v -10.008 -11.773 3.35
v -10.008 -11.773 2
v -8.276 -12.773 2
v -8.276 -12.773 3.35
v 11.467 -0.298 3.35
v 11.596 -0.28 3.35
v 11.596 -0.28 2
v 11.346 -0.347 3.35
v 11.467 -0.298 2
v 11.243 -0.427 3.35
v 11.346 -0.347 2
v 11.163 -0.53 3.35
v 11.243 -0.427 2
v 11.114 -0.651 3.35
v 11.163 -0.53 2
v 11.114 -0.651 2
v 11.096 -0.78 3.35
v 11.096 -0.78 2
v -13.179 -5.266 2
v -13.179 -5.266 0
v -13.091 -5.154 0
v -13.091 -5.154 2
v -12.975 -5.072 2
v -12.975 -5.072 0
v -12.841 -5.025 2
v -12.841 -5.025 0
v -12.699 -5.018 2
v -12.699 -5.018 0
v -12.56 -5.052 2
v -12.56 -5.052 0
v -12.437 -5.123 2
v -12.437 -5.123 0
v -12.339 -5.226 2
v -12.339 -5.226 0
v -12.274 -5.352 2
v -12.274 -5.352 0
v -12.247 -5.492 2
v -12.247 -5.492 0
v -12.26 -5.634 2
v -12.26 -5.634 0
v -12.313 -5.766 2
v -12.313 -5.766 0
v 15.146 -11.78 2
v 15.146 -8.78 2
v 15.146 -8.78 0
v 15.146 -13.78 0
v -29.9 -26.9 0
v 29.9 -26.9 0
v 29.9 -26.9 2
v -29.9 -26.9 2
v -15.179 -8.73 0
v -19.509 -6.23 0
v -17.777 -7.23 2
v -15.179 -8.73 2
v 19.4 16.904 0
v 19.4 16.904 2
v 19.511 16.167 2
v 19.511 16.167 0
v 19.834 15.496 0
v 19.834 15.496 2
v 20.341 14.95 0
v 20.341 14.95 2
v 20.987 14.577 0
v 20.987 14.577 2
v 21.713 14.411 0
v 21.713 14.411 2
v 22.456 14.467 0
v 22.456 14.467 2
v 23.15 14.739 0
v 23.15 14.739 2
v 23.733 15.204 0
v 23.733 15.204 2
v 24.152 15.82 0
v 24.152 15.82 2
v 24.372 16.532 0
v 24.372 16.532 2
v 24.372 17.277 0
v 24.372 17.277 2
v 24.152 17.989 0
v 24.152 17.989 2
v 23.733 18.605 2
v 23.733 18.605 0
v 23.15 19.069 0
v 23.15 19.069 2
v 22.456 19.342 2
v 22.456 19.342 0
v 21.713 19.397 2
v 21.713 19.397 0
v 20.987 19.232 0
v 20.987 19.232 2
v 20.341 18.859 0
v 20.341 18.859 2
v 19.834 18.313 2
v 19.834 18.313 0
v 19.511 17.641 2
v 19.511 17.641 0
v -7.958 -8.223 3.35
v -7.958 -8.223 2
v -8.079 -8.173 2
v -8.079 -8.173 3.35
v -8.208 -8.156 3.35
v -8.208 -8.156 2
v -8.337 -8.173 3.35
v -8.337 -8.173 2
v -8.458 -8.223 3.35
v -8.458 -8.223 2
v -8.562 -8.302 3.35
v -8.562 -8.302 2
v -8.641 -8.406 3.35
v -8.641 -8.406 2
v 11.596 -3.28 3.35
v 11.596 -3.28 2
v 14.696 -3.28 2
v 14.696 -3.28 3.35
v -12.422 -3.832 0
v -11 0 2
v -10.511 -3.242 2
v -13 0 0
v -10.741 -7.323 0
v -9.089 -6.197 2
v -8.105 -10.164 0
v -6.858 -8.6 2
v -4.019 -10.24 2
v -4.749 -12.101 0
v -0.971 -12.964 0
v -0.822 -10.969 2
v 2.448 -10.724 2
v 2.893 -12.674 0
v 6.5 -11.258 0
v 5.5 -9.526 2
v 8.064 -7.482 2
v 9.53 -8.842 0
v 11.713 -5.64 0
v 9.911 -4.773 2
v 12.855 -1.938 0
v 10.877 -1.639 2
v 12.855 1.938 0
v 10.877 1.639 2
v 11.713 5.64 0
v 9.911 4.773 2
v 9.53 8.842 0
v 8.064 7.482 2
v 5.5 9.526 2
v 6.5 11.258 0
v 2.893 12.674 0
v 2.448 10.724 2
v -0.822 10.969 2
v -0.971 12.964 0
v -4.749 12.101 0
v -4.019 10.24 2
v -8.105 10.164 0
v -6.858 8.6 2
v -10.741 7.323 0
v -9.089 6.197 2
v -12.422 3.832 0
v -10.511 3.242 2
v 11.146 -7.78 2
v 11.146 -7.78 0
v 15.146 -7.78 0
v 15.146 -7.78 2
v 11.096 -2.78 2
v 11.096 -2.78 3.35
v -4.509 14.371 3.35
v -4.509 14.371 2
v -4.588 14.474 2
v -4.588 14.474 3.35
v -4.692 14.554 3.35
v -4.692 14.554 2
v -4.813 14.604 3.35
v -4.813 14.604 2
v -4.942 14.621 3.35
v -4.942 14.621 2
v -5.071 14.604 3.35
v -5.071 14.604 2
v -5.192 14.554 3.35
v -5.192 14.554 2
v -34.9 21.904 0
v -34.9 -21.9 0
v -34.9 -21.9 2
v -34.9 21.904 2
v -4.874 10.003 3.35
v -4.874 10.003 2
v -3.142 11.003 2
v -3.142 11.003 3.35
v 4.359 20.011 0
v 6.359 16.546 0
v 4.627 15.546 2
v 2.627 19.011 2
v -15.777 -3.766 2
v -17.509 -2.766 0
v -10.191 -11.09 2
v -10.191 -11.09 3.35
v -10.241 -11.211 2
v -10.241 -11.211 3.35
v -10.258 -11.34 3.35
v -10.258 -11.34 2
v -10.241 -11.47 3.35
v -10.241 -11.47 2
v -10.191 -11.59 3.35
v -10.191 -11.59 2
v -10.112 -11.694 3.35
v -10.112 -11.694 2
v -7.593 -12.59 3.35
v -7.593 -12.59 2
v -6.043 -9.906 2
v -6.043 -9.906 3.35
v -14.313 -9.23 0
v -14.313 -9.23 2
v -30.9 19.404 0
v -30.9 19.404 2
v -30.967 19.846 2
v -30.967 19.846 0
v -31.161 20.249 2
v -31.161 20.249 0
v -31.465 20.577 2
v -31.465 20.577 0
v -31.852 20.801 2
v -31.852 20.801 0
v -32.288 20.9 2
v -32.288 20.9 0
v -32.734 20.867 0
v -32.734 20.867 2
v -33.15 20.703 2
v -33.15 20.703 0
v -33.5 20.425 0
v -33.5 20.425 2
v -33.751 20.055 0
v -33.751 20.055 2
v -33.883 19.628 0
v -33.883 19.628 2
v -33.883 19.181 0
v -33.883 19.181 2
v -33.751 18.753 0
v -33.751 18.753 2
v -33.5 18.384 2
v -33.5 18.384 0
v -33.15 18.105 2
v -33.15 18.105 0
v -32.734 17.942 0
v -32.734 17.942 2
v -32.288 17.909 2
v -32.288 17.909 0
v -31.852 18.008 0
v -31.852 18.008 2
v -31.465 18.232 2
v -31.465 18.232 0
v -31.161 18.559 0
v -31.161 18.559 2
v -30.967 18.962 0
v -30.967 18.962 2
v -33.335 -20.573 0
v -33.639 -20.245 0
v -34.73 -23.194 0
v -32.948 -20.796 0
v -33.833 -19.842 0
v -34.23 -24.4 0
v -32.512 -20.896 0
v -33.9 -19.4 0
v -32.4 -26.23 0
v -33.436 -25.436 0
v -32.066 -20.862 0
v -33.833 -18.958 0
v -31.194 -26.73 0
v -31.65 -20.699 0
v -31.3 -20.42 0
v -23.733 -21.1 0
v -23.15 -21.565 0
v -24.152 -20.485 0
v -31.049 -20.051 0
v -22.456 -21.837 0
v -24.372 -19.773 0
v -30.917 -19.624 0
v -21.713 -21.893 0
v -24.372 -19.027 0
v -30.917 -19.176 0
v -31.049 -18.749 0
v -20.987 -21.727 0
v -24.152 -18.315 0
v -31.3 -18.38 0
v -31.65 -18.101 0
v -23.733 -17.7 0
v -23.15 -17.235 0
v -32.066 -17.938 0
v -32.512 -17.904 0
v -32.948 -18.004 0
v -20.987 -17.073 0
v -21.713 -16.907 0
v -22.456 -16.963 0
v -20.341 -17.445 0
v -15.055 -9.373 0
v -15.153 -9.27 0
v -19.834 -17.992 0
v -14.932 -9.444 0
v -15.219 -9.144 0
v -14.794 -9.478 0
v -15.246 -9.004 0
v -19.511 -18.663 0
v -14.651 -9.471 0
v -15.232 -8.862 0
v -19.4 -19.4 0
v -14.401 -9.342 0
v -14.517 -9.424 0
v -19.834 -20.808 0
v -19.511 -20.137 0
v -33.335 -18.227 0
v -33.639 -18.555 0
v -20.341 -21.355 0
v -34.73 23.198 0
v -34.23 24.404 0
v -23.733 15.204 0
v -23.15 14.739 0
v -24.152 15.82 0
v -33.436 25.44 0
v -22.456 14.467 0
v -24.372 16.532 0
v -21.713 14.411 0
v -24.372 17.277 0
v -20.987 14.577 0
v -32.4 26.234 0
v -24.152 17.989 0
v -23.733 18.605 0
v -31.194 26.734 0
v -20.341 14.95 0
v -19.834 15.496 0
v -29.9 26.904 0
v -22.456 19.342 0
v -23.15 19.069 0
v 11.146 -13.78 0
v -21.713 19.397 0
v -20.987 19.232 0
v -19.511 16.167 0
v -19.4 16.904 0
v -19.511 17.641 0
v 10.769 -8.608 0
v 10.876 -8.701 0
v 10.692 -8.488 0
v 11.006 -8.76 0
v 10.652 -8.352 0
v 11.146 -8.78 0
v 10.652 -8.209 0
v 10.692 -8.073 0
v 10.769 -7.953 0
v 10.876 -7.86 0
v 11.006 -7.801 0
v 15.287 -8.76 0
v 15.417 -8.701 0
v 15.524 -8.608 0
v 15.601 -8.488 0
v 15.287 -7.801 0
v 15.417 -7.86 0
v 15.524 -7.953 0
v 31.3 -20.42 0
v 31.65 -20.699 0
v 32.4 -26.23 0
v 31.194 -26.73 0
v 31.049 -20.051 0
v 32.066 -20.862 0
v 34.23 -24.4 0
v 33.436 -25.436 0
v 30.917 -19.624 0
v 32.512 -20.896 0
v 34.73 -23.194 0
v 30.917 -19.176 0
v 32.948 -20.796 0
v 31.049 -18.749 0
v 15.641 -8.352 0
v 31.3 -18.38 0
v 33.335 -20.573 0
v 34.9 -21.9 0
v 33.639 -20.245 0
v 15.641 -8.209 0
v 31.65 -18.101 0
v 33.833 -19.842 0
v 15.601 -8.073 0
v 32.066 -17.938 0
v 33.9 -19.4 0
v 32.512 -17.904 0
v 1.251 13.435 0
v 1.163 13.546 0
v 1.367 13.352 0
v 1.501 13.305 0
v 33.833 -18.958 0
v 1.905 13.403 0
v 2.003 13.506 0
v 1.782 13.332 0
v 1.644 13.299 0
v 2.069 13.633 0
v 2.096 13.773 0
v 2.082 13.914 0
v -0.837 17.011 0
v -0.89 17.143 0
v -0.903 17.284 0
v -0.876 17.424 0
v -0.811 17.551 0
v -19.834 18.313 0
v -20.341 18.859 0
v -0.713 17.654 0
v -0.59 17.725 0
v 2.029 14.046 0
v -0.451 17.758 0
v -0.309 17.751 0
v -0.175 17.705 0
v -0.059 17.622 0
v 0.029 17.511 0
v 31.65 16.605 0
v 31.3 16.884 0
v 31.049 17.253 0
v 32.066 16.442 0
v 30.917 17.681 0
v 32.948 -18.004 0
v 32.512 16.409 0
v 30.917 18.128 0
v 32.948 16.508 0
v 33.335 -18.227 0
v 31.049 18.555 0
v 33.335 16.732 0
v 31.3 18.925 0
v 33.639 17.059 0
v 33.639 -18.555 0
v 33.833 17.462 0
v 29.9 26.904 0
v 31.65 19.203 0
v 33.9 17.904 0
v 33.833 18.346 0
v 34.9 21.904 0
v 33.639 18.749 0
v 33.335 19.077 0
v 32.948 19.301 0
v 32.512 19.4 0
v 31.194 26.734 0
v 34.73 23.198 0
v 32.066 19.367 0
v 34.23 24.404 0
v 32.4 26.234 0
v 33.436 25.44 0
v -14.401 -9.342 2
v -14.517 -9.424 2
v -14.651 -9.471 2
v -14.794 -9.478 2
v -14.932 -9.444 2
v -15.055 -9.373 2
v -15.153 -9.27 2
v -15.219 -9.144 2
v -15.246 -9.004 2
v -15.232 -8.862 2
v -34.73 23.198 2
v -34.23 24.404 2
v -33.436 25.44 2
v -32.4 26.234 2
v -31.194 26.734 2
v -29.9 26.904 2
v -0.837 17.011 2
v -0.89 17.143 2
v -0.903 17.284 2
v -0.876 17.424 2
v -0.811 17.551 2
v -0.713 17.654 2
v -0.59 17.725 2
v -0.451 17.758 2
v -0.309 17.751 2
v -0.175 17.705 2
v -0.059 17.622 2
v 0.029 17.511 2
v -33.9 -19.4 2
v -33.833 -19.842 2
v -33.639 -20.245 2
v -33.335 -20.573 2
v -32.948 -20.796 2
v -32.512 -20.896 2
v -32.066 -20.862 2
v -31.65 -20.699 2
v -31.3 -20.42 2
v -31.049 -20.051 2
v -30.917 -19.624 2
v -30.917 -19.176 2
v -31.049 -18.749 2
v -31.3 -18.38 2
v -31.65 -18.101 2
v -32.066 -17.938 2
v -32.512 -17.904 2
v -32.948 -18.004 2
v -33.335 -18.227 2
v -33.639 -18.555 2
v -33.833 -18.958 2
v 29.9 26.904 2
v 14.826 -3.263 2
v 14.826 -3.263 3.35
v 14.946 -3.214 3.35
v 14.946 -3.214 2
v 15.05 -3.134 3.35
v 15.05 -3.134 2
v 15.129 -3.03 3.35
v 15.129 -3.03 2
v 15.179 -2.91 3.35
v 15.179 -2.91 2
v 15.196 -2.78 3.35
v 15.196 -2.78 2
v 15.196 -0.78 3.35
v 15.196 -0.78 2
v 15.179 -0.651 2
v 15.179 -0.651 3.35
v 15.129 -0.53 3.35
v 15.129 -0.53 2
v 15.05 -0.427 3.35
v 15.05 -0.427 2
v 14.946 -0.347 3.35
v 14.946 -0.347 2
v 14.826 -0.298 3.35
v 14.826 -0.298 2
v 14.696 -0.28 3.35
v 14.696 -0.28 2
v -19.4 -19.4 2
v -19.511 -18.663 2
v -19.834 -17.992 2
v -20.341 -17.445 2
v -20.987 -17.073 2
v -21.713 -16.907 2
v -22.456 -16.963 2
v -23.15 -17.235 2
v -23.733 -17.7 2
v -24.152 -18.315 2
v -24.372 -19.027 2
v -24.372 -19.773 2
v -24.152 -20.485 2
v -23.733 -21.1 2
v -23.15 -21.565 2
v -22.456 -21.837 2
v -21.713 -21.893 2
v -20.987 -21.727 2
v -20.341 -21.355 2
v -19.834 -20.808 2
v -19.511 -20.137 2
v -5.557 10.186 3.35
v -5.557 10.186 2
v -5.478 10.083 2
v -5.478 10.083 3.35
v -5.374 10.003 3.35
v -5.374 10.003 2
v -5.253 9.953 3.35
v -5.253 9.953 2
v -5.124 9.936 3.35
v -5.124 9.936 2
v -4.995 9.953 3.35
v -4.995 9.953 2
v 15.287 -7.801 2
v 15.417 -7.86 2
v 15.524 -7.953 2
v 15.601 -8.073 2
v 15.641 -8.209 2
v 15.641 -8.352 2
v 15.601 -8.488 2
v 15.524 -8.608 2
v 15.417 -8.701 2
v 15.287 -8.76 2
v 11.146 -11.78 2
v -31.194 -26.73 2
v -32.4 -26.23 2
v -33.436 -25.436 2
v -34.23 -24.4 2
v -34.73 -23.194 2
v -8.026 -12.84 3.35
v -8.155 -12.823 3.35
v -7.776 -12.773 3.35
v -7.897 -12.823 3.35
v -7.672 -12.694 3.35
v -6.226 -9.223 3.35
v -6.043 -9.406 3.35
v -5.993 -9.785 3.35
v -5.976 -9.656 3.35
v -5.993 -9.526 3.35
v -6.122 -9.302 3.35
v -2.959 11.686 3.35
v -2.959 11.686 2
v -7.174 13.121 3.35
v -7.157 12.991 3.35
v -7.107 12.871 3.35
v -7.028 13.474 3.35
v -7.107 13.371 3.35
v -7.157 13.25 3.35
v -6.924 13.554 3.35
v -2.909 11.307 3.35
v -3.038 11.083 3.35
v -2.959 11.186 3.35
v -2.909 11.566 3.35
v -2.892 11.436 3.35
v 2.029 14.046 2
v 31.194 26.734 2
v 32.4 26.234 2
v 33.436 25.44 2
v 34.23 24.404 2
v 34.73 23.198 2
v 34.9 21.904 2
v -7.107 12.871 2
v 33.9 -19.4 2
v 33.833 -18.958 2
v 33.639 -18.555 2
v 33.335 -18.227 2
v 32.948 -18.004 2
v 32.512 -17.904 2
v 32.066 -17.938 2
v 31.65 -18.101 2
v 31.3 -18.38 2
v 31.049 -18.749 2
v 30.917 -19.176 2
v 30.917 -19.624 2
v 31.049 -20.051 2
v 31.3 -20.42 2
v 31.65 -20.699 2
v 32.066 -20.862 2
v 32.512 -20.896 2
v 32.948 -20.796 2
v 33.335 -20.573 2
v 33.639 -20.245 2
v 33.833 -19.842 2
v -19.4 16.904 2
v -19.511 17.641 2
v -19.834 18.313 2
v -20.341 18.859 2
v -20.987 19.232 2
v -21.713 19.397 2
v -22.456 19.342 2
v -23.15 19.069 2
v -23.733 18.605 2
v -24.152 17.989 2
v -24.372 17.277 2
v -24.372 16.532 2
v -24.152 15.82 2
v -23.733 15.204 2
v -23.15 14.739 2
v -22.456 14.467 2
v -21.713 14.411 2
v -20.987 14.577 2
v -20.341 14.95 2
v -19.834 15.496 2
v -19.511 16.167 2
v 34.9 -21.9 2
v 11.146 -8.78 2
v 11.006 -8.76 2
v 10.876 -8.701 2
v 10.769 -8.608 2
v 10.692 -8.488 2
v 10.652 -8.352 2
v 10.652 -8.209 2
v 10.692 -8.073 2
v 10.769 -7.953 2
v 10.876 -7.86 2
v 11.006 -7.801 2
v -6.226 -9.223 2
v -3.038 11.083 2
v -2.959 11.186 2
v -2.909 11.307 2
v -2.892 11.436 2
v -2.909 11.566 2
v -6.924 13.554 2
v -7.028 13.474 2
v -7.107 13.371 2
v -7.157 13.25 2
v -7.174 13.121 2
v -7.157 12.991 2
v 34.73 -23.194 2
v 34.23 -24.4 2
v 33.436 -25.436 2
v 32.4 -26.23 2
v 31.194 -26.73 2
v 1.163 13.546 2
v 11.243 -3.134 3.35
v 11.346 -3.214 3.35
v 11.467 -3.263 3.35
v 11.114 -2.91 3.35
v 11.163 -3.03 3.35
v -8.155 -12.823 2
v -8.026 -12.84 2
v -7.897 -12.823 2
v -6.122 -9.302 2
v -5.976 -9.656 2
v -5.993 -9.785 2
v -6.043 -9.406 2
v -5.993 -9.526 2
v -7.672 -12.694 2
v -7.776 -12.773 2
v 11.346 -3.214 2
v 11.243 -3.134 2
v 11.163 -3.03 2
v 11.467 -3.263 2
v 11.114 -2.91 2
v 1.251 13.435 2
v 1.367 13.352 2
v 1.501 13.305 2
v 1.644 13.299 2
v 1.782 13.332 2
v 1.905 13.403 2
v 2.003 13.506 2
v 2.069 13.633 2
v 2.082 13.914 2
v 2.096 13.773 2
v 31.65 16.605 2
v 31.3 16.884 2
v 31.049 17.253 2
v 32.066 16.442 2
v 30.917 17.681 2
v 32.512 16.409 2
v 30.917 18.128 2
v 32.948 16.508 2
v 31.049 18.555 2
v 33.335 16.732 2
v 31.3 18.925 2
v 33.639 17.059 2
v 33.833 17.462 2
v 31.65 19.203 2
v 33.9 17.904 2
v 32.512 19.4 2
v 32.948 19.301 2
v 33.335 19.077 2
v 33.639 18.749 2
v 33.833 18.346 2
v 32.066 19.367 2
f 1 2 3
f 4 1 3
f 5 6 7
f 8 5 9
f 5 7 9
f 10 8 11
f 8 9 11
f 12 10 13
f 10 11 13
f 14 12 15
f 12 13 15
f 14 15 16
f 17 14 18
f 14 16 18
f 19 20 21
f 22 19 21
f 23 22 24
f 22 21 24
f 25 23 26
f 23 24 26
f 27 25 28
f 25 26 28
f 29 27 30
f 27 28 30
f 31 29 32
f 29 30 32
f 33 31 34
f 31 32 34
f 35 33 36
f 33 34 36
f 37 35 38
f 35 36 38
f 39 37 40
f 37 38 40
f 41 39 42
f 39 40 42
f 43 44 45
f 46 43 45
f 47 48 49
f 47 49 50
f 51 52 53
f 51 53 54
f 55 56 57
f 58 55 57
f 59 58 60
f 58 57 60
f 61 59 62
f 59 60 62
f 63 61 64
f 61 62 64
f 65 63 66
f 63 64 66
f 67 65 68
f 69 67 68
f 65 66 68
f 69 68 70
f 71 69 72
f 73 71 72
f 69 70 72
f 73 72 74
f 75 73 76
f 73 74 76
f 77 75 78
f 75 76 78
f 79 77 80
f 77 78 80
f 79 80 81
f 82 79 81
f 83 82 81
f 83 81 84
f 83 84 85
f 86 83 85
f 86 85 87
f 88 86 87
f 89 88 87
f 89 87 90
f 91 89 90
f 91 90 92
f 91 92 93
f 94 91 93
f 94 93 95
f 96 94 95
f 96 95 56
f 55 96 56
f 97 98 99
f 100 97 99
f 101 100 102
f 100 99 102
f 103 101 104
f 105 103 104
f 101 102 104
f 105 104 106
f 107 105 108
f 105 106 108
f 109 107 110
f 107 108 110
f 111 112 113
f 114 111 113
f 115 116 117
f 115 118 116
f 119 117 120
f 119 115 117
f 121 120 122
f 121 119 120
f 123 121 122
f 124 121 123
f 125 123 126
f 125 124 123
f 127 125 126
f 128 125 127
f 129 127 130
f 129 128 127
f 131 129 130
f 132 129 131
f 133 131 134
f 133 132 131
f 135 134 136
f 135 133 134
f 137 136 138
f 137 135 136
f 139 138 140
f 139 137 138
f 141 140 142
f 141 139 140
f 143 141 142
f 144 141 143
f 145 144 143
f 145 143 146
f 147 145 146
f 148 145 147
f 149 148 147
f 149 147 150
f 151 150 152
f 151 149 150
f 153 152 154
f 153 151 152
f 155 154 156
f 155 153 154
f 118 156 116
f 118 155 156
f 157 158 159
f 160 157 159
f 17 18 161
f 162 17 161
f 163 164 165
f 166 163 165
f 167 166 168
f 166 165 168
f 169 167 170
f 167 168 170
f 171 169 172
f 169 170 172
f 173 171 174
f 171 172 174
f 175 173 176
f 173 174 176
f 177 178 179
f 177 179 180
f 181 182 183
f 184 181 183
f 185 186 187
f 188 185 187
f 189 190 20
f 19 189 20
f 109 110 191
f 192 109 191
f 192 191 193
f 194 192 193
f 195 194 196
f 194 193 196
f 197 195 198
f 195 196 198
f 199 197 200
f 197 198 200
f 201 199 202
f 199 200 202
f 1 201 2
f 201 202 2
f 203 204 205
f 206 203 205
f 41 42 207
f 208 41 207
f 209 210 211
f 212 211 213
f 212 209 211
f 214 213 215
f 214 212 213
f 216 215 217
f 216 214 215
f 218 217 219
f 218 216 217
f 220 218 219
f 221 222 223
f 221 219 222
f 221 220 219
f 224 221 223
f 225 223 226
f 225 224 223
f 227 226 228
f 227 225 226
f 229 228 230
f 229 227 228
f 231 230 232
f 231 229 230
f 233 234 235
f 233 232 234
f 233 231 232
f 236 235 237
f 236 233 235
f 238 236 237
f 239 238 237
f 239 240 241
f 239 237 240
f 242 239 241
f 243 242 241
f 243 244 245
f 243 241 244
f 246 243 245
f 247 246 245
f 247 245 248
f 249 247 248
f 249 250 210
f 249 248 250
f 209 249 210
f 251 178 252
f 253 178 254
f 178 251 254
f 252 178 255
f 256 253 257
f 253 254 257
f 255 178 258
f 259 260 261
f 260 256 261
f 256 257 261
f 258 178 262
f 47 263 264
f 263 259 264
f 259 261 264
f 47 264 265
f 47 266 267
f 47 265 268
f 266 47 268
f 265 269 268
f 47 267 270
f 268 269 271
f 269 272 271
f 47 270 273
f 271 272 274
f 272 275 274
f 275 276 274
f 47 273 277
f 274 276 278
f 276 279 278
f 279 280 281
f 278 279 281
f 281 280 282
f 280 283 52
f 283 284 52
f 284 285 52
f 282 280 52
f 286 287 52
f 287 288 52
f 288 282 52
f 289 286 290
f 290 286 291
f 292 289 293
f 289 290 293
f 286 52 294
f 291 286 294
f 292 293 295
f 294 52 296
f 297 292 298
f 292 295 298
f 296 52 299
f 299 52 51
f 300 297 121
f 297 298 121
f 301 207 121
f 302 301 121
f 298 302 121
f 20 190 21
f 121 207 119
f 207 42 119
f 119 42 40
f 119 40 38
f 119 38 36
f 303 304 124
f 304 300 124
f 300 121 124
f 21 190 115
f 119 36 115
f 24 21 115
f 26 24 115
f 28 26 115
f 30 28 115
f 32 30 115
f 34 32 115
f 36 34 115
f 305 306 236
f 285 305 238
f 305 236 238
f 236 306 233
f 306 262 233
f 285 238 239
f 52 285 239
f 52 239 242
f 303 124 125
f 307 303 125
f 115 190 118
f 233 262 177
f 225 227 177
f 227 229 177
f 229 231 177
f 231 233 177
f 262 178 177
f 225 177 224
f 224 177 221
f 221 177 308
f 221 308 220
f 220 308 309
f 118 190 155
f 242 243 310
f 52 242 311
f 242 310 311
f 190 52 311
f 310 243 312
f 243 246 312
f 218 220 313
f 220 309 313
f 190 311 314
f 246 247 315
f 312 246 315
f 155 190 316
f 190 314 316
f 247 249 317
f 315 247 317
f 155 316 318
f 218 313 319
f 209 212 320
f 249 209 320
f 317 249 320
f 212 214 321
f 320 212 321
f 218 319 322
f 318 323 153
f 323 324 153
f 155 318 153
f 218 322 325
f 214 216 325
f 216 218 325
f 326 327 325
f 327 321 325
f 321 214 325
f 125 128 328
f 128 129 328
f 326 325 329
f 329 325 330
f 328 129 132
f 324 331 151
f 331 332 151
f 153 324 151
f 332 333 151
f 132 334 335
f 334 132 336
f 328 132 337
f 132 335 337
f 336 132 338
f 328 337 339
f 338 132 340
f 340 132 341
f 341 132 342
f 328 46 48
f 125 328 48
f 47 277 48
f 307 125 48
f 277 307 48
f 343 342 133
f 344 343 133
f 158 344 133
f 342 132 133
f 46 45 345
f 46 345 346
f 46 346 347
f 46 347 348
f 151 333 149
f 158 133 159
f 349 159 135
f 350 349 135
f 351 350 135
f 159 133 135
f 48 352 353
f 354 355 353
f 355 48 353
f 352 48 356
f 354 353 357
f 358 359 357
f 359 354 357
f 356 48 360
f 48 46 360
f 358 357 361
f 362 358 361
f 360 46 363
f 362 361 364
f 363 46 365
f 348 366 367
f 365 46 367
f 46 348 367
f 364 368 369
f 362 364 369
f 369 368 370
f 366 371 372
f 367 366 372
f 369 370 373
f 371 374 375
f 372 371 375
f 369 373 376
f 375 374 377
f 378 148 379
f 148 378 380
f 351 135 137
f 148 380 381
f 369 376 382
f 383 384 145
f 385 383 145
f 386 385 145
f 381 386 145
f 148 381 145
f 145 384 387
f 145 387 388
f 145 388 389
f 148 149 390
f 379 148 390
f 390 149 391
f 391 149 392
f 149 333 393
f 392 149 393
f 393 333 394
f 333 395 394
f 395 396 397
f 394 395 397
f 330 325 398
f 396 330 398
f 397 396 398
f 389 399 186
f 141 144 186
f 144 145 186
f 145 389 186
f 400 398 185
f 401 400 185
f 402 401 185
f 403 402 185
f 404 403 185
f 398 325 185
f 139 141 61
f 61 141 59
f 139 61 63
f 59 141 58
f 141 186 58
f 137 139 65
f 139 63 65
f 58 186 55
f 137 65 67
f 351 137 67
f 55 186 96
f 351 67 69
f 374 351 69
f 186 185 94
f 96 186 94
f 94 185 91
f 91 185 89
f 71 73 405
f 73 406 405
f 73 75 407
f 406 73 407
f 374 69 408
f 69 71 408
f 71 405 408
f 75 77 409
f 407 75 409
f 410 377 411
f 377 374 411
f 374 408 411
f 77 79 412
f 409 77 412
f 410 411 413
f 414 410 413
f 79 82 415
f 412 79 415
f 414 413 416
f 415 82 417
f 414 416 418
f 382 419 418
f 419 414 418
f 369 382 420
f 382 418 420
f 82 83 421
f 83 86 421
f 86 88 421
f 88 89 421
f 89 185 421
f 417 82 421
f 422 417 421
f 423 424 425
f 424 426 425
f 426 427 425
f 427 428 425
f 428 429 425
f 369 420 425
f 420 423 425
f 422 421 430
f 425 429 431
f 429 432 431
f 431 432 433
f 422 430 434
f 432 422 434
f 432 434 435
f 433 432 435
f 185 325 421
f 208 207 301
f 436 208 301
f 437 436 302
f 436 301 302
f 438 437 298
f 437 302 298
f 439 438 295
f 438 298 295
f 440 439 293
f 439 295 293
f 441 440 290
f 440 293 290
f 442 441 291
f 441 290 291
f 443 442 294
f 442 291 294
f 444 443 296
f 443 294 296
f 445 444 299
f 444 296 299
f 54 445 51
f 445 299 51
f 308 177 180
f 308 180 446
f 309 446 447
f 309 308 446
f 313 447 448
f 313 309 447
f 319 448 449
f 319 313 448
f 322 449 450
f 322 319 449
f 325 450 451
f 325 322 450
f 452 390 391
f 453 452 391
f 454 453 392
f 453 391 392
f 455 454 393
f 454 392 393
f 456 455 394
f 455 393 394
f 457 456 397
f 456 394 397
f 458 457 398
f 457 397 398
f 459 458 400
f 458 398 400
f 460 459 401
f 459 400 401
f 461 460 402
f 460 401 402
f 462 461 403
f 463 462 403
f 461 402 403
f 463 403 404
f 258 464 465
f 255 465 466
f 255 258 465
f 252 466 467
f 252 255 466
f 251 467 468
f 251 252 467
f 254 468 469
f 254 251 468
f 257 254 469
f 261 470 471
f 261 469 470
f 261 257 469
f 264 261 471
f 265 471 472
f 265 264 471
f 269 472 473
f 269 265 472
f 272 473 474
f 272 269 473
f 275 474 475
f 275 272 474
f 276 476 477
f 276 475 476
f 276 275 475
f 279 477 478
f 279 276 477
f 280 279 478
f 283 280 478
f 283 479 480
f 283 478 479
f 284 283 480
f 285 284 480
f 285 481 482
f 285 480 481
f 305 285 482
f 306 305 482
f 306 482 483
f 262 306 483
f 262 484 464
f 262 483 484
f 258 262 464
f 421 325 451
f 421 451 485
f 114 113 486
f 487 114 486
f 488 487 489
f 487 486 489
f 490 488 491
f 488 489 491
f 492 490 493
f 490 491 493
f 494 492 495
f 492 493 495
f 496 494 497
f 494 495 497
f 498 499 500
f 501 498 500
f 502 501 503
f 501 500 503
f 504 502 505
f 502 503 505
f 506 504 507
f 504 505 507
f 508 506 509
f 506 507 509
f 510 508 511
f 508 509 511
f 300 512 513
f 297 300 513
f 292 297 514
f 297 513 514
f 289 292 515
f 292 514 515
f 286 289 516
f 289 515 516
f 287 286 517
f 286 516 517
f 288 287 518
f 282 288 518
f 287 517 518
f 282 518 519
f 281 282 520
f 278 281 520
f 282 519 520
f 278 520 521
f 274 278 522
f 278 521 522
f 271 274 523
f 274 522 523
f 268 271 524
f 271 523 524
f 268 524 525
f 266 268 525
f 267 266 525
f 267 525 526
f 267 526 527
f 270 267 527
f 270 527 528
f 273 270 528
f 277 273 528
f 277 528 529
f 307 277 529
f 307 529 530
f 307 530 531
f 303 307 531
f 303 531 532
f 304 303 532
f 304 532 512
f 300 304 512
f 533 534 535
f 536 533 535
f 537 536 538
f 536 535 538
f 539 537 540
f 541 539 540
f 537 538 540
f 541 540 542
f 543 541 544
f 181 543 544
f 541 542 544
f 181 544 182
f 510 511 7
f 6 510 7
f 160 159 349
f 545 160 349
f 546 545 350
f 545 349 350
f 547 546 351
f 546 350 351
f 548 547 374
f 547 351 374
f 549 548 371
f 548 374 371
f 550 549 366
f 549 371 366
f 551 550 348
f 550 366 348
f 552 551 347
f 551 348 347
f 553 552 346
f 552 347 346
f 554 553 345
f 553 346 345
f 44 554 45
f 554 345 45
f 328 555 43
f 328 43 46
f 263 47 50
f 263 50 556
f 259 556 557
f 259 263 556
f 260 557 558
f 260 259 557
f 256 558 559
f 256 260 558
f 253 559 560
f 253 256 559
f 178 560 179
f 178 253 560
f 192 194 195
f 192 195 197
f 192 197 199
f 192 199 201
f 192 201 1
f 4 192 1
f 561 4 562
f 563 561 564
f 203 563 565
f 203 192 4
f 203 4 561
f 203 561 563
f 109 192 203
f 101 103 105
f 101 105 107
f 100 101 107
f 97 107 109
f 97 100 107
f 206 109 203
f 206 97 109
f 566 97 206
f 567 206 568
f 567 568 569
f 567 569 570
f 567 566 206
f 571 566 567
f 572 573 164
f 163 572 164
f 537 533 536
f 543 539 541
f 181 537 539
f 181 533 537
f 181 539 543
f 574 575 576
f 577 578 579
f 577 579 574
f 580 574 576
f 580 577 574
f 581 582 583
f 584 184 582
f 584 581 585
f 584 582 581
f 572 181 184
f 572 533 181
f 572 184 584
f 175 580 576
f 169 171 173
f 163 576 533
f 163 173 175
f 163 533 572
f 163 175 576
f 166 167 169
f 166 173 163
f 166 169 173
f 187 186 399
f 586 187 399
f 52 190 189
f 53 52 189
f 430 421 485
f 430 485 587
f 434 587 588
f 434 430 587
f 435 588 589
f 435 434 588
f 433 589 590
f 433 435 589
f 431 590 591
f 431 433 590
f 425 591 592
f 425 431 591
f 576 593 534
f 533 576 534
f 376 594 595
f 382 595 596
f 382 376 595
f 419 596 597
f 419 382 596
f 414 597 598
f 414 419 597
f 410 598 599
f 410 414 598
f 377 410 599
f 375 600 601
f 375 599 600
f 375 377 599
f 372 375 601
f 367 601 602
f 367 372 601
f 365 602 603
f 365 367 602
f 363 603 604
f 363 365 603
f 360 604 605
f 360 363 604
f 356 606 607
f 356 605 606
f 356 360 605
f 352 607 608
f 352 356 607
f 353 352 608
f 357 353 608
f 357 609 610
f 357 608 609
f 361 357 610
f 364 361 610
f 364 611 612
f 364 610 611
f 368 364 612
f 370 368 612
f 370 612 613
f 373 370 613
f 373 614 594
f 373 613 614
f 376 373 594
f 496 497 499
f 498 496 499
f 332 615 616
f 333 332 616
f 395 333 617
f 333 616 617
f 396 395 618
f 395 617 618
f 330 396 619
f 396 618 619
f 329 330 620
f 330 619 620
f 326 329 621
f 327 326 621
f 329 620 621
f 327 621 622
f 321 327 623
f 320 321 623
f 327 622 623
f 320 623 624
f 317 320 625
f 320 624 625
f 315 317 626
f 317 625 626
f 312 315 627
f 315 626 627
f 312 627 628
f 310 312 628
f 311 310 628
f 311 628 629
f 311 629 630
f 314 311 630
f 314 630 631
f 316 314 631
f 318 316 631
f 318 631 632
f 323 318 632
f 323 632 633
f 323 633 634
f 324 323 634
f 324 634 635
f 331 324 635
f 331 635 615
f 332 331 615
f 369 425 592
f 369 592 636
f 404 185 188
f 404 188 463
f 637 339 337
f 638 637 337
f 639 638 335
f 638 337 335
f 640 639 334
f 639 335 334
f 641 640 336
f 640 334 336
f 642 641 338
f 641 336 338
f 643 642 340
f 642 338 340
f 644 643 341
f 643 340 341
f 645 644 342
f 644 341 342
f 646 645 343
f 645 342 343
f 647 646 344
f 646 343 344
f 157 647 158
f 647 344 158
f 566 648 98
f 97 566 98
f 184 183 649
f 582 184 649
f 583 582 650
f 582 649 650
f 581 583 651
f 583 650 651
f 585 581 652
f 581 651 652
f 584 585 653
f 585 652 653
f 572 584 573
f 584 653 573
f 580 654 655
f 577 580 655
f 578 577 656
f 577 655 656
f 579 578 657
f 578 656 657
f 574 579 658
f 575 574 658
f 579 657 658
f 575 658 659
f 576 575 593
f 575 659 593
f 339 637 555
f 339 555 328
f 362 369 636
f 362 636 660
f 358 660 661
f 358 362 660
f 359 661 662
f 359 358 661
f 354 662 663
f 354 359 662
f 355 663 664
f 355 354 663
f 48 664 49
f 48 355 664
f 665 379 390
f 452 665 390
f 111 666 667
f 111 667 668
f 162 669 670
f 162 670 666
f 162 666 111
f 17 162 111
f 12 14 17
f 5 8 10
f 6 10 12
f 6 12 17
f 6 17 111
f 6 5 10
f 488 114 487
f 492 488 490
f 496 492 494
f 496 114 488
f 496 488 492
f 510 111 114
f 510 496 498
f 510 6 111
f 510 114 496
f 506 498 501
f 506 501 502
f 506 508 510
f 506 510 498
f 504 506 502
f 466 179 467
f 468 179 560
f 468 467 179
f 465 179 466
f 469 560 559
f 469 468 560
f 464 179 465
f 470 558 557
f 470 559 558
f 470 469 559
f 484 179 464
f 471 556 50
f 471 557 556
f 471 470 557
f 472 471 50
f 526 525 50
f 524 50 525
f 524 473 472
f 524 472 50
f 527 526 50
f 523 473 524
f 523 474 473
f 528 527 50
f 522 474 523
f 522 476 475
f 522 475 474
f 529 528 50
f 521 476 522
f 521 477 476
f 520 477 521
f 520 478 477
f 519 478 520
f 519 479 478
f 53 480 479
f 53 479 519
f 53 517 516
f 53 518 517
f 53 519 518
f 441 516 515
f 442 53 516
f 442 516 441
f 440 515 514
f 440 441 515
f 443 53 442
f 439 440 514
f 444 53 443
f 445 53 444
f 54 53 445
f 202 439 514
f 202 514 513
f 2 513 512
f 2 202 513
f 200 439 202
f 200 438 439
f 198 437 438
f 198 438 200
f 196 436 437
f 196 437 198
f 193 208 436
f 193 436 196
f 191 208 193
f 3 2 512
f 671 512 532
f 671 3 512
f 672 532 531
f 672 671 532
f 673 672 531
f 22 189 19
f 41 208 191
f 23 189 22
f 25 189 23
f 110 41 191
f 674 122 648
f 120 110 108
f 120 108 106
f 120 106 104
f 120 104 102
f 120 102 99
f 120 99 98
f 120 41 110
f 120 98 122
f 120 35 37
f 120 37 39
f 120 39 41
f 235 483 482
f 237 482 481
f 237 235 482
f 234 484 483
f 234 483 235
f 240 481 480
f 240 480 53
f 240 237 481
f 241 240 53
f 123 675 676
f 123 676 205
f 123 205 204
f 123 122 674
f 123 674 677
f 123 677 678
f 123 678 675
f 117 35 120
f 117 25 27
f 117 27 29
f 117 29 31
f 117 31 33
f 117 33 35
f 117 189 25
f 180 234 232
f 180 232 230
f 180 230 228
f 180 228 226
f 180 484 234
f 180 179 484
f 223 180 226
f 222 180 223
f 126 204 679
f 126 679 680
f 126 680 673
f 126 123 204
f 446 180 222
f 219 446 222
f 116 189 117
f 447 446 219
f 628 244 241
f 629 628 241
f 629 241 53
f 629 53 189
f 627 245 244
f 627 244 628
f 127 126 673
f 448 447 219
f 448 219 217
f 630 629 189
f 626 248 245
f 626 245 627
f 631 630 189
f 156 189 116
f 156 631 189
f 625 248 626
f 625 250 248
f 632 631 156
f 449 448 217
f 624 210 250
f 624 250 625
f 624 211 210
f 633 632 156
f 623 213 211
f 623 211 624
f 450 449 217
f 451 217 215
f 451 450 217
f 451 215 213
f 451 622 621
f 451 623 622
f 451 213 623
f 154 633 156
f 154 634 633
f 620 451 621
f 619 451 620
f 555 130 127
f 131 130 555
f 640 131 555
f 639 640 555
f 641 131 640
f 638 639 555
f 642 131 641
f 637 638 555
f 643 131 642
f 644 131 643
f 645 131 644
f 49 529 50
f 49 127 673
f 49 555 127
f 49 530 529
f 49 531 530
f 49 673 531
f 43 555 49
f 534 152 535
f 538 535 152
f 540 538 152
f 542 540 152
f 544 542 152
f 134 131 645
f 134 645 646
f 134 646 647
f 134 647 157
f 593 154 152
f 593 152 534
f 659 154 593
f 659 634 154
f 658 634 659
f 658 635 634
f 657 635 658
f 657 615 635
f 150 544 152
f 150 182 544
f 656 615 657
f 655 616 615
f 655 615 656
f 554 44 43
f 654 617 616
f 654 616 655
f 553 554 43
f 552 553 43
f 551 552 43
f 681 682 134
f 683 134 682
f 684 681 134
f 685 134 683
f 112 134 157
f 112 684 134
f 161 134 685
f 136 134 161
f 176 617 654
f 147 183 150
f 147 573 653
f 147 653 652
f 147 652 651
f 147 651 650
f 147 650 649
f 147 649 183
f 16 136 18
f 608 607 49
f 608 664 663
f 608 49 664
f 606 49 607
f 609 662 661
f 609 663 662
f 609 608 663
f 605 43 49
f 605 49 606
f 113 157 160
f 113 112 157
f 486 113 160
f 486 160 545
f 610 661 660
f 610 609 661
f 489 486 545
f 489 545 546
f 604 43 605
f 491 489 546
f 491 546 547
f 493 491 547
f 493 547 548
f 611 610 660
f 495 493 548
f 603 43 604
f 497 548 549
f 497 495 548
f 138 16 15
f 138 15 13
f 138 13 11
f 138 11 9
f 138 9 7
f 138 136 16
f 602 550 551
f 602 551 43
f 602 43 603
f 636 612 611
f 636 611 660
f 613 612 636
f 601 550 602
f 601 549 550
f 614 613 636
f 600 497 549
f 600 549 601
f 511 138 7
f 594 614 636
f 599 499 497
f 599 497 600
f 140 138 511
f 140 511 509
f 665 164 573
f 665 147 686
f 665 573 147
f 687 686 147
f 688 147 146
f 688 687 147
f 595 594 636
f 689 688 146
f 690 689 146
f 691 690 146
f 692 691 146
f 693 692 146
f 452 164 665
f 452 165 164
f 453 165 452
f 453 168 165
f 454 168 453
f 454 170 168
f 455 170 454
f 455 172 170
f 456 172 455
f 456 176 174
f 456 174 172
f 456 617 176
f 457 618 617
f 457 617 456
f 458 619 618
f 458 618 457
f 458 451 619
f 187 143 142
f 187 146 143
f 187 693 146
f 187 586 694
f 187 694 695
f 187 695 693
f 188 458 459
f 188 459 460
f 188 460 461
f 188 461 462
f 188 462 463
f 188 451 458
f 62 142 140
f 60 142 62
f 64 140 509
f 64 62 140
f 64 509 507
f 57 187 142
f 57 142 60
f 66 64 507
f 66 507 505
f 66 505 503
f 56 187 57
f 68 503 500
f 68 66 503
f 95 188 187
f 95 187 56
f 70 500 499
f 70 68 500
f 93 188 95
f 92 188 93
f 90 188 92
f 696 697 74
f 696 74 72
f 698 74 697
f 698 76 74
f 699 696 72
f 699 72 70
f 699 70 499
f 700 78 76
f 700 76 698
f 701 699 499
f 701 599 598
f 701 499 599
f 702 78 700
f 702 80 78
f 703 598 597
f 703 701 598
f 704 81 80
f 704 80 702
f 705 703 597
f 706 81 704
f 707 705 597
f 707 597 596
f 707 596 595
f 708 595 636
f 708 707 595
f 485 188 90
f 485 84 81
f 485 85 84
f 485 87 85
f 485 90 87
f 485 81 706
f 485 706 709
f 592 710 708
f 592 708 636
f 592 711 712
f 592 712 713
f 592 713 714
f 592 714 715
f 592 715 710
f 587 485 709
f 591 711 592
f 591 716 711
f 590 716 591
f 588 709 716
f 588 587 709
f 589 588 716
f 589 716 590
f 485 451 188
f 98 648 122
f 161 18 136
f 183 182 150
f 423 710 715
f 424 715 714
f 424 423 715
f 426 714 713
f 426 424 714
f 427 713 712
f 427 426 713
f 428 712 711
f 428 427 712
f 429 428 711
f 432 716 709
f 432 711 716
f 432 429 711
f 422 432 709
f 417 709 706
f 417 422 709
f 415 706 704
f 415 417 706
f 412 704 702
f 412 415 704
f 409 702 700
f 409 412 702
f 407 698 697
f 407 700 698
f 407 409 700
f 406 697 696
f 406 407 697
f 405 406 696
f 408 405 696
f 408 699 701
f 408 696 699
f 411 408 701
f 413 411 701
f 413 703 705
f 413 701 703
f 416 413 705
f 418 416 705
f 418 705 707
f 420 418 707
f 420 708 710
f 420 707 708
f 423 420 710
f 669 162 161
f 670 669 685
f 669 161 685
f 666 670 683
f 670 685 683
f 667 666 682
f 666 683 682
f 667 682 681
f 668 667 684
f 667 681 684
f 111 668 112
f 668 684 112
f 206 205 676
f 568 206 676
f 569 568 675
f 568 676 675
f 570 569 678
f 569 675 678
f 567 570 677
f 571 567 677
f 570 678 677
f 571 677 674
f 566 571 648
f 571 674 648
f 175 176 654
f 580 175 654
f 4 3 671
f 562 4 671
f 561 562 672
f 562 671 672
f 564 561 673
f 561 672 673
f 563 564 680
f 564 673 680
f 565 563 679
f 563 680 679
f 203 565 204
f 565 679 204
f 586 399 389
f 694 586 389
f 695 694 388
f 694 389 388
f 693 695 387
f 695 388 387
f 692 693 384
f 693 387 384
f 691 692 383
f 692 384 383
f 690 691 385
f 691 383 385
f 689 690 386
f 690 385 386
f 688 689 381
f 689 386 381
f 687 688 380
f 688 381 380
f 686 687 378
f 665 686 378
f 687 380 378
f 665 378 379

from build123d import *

# Parameters (mm, degrees)
SKETCH_1_W          = 76
SKETCH_1_H          = 60
EXTRUDE_1_DEPTH     = 2
EXTRUDE_2_DEPTH     = 3.35
SKETCH_2_W          = 76
SKETCH_2_H          = 60
CUT_EXTRUDE_1_DEPTH = 2.95
SKETCH_3_R          = 1.715
CUT_EXTRUDE_2_DEPTH = 10
SKETCH_5_R          = 1.5
CUT_EXTRUDE_3_DEPTH = 45.193605611
SKETCH_6_R          = 2.5
CUT_EXTRUDE_4_DEPTH = 45.111815616
CUT_EXTRUDE_5_DEPTH = 4
CUT_EXTRUDE_6_DEPTH = 4
CUT_EXTRUDE_7_DEPTH = 4


with BuildPart() as part:
    # 草圖1 → 填料-伸長1 (new body)
    with BuildSketch(Plane.XY):
        Rectangle(SKETCH_1_W, SKETCH_1_H)
        with BuildLine():
            Line((-6.042909564, -9.905650781), (-7.592909564, -12.590329533))
            ThreePointArc((-7.592909564, -12.590329533), (-7.896512744, -12.823292446), (-8.275922266, -12.773342235))
            Line((-8.275922266, -12.773342235), (-10.007973074, -11.773342235))
            ThreePointArc((-10.007973074, -11.773342235), (-10.240935987, -11.469739056), (-10.190985776, -11.090329533))
            Line((-10.190985776, -11.090329533), (-8.640985776, -8.405650781))
            ThreePointArc((-8.640985776, -8.405650781), (-8.337382596, -8.172687868), (-7.957973074, -8.22263808))
            Line((-7.957973074, -8.22263808), (-6.225922266, -9.22263808))
            ThreePointArc((-6.225922266, -9.22263808), (-5.992959353, -9.526241259), (-6.042909564, -9.905650781))
        make_face(mode=Mode.SUBTRACT)
        with BuildLine():
            ThreePointArc((-14.313100093, -9.230040965), (-14.996112795, -9.413053667), (-15.179125497, -8.730040965))
            Line((-15.179125497, -8.730040965), (-13.179125497, -5.26593935))
            ThreePointArc((-13.179125497, -5.26593935), (-12.496112795, -5.082926648), (-12.313100093, -5.76593935))
            Line((-12.313100093, -5.76593935), (-14.313100093, -9.230040965))
        make_face(mode=Mode.SUBTRACT)
        with BuildLine():
            ThreePointArc((11.146484837, -8.780487805), (10.646484837, -8.280487805), (11.146484837, -7.780487805))
            Line((11.146484837, -7.780487805), (15.146484837, -7.780487805))
            ThreePointArc((15.146484837, -7.780487805), (15.646484837, -8.280487805), (15.146484837, -8.780487805))
            Line((15.146484837, -8.780487805), (11.146484837, -8.780487805))
        make_face(mode=Mode.SUBTRACT)
        with BuildLine():
            Line((-5.557090436, 10.186138586), (-7.107090436, 12.870817338))
            ThreePointArc((-7.107090436, 12.870817338), (-7.157040647, 13.250226861), (-6.924077734, 13.55383004))
            Line((-6.924077734, 13.55383004), (-5.192026926, 14.55383004))
            ThreePointArc((-5.192026926, 14.55383004), (-4.812617404, 14.603780251), (-4.509014224, 14.370817338))
            Line((-4.509014224, 14.370817338), (-2.959014224, 11.686138586))
            ThreePointArc((-2.959014224, 11.686138586), (-2.909064013, 11.306729064), (-3.142026926, 11.003125884))
            Line((-3.142026926, 11.003125884), (-4.874077734, 10.003125884))
            ThreePointArc((-4.874077734, 10.003125884), (-5.253487256, 9.953175673), (-5.557090436, 10.186138586))
        make_face(mode=Mode.SUBTRACT)
        with BuildLine():
            Line((1.163100093, 13.546427155), (-0.836899907, 17.01052877))
            ThreePointArc((-0.836899907, 17.01052877), (-0.653887205, 17.693541472), (0.029125497, 17.51052877))
            Line((0.029125497, 17.51052877), (2.029125497, 14.046427155))
            ThreePointArc((2.029125497, 14.046427155), (1.846112795, 13.363414453), (1.163100093, 13.546427155))
        make_face(mode=Mode.SUBTRACT)
    extrude(amount=EXTRUDE_1_DEPTH)

    # 草圖1<3> → 填料-伸長2 (add)
    with BuildSketch(Plane.XY):
        with BuildLine():
            Line((14.696484837, -0.280487805), (11.596484837, -0.280487805))
            ThreePointArc((11.596484837, -0.280487805), (11.242931447, -0.426934414), (11.096484837, -0.780487805))
            Line((11.096484837, -0.780487805), (11.096484837, -2.780487805))
            ThreePointArc((11.096484837, -2.780487805), (11.242931447, -3.134041195), (11.596484837, -3.280487805))
            Line((11.596484837, -3.280487805), (14.696484837, -3.280487805))
            ThreePointArc((14.696484837, -3.280487805), (15.050038228, -3.134041195), (15.196484837, -2.780487805))
            Line((15.196484837, -2.780487805), (15.196484837, -0.780487805))
            ThreePointArc((15.196484837, -0.780487805), (15.050038228, -0.426934414), (14.696484837, -0.280487805))
        make_face()
        with BuildLine():
            Line((-7.592909564, -12.590329533), (-6.042909564, -9.905650781))
            ThreePointArc((-6.042909564, -9.905650781), (-5.992959353, -9.526241259), (-6.225922266, -9.22263808))
            Line((-6.225922266, -9.22263808), (-7.957973074, -8.22263808))
            ThreePointArc((-7.957973074, -8.22263808), (-8.337382596, -8.172687868), (-8.640985776, -8.405650781))
            Line((-8.640985776, -8.405650781), (-10.190985776, -11.090329533))
            ThreePointArc((-10.190985776, -11.090329533), (-10.240935987, -11.469739056), (-10.007973074, -11.773342235))
            Line((-10.007973074, -11.773342235), (-8.275922266, -12.773342235))
            ThreePointArc((-8.275922266, -12.773342235), (-7.896512744, -12.823292446), (-7.592909564, -12.590329533))
        make_face()
        with BuildLine():
            Line((-7.107090436, 12.870817338), (-5.557090436, 10.186138586))
            ThreePointArc((-5.557090436, 10.186138586), (-5.253487256, 9.953175673), (-4.874077734, 10.003125884))
            Line((-4.874077734, 10.003125884), (-3.142026926, 11.003125884))
            ThreePointArc((-3.142026926, 11.003125884), (-2.909064013, 11.306729064), (-2.959014224, 11.686138586))
            Line((-2.959014224, 11.686138586), (-4.509014224, 14.370817338))
            ThreePointArc((-4.509014224, 14.370817338), (-4.812617404, 14.603780251), (-5.192026926, 14.55383004))
            Line((-5.192026926, 14.55383004), (-6.924077734, 13.55383004))
            ThreePointArc((-6.924077734, 13.55383004), (-7.157040647, 13.250226861), (-7.107090436, 12.870817338))
        make_face()
    extrude(amount=EXTRUDE_2_DEPTH)

    # 草圖2 → 除料-伸長1 (cut)
    with BuildSketch(Plane(origin=(0, 0, 0), x_dir=(-1, 0, 0), z_dir=(0, 0, -1))):
        Rectangle(SKETCH_2_W, SKETCH_2_H)
        with BuildLine():
            ThreePointArc((-29.9, 26.904317068), (-33.435533906, 25.439850974), (-34.9, 21.904317068))
            Line((-34.9, 21.904317068), (-34.9, -21.9))
            ThreePointArc((-34.9, -21.9), (-33.435533906, -25.435533906), (-29.9, -26.9))
            Line((-29.9, -26.9), (29.9, -26.9))
            ThreePointArc((29.9, -26.9), (33.435533906, -25.435533906), (34.9, -21.9))
            Line((34.9, -21.9), (34.9, 21.904317068))
            ThreePointArc((34.9, 21.904317068), (33.435533906, 25.439850974), (29.9, 26.904317068))
            Line((29.9, 26.904317068), (-29.9, 26.904317068))
        make_face(mode=Mode.SUBTRACT)
    extrude(amount=-CUT_EXTRUDE_1_DEPTH, mode=Mode.SUBTRACT)

    # 草圖3 → 除料-伸長2 (cut)
    with BuildSketch(Plane(origin=(0, 0, 0), x_dir=(-1, 0, 0), z_dir=(0, 0, -1))):
        Circle(SKETCH_3_R)
    extrude(amount=-CUT_EXTRUDE_2_DEPTH, mode=Mode.SUBTRACT)

    # 草圖4 → 除料-旋轉1 (revolve, cut)
    with BuildSketch(Plane(origin=(0, 0, 0), x_dir=(1, 0, 0), z_dir=(0, 1, 0)), mode=Mode.PRIVATE) as cut_revolve_1_sk:
        Polygon((0, -2), (11, -2), (13, 0), (0, 0), align=None)
    revolve(cut_revolve_1_sk.sketch.rotate(Axis((0, 0, -2.897060396), (0, 0, 1)), 180), axis=Axis((0, 0, -2.897060396), (0, 0, 1)), mode=Mode.SUBTRACT)

    # 草圖5 → 除料-伸長3 (cut, through all)
    with BuildSketch(Plane.XY):
        with Locations((32.4, 17.904317068)):
            Circle(SKETCH_5_R)
        with Locations((-32.4, 19.404317068)):
            Circle(SKETCH_5_R)
        with Locations(Location((-32.4, -19.4, 0), (0, 0, 180))):
            Circle(SKETCH_5_R)
        with Locations((32.4, -19.4)):
            Circle(SKETCH_5_R)
    extrude(amount=CUT_EXTRUDE_3_DEPTH, mode=Mode.SUBTRACT)

    # 草圖6 → 除料-伸長4 (cut, through all)
    with BuildSketch(Plane.XY.offset(2)):
        with Locations((-21.9, 16.904317068)):
            Circle(SKETCH_6_R)
        with Locations(Location((21.9, 16.904317068, 0), (0, 0, 180))):
            Circle(SKETCH_6_R)
        with Locations((-21.9, -19.4)):
            Circle(SKETCH_6_R)
    extrude(amount=-CUT_EXTRUDE_4_DEPTH, mode=Mode.SUBTRACT)

    # 草圖7 → 除料-伸長5 (cut)
    with BuildSketch(Plane.ZY.offset(-11.146484837)):
        Polygon((2, -8.780487805), (2, -11.780487805), (0, -13.780487805), (0, -8.780487805), align=None)
    extrude(amount=-CUT_EXTRUDE_5_DEPTH, mode=Mode.SUBTRACT)

    # 草圖8 → 除料-伸長6 (cut)
    with BuildSketch(Plane(origin=(-5.575, -9.656183252, 0), x_dir=(0.8660254037844398, -0.499999999999998, 0), z_dir=(0.49999999999999806, 0.8660254037844399, 0))):
        Polygon((-8.780487805, -2), (-8.780487805, 0), (-13.780487805, 0), (-11.780487805, -2), align=None)
    extrude(amount=-CUT_EXTRUDE_6_DEPTH, mode=Mode.SUBTRACT)

    # 草圖9 → 除料-伸長7 (cut)
    with BuildSketch(Plane(origin=(-5.575, 9.656183252, 0), x_dir=(-0.8660254037844397, -0.49999999999999806, 0), z_dir=(0.49999999999999806, -0.8660254037844397, 0))):
        Polygon((-8.780487805, -2), (-8.780487805, 0), (-13.780487805, 0), (-11.780487805, -2), align=None)
    extrude(amount=-CUT_EXTRUDE_7_DEPTH, mode=Mode.SUBTRACT)


solid = part.part
